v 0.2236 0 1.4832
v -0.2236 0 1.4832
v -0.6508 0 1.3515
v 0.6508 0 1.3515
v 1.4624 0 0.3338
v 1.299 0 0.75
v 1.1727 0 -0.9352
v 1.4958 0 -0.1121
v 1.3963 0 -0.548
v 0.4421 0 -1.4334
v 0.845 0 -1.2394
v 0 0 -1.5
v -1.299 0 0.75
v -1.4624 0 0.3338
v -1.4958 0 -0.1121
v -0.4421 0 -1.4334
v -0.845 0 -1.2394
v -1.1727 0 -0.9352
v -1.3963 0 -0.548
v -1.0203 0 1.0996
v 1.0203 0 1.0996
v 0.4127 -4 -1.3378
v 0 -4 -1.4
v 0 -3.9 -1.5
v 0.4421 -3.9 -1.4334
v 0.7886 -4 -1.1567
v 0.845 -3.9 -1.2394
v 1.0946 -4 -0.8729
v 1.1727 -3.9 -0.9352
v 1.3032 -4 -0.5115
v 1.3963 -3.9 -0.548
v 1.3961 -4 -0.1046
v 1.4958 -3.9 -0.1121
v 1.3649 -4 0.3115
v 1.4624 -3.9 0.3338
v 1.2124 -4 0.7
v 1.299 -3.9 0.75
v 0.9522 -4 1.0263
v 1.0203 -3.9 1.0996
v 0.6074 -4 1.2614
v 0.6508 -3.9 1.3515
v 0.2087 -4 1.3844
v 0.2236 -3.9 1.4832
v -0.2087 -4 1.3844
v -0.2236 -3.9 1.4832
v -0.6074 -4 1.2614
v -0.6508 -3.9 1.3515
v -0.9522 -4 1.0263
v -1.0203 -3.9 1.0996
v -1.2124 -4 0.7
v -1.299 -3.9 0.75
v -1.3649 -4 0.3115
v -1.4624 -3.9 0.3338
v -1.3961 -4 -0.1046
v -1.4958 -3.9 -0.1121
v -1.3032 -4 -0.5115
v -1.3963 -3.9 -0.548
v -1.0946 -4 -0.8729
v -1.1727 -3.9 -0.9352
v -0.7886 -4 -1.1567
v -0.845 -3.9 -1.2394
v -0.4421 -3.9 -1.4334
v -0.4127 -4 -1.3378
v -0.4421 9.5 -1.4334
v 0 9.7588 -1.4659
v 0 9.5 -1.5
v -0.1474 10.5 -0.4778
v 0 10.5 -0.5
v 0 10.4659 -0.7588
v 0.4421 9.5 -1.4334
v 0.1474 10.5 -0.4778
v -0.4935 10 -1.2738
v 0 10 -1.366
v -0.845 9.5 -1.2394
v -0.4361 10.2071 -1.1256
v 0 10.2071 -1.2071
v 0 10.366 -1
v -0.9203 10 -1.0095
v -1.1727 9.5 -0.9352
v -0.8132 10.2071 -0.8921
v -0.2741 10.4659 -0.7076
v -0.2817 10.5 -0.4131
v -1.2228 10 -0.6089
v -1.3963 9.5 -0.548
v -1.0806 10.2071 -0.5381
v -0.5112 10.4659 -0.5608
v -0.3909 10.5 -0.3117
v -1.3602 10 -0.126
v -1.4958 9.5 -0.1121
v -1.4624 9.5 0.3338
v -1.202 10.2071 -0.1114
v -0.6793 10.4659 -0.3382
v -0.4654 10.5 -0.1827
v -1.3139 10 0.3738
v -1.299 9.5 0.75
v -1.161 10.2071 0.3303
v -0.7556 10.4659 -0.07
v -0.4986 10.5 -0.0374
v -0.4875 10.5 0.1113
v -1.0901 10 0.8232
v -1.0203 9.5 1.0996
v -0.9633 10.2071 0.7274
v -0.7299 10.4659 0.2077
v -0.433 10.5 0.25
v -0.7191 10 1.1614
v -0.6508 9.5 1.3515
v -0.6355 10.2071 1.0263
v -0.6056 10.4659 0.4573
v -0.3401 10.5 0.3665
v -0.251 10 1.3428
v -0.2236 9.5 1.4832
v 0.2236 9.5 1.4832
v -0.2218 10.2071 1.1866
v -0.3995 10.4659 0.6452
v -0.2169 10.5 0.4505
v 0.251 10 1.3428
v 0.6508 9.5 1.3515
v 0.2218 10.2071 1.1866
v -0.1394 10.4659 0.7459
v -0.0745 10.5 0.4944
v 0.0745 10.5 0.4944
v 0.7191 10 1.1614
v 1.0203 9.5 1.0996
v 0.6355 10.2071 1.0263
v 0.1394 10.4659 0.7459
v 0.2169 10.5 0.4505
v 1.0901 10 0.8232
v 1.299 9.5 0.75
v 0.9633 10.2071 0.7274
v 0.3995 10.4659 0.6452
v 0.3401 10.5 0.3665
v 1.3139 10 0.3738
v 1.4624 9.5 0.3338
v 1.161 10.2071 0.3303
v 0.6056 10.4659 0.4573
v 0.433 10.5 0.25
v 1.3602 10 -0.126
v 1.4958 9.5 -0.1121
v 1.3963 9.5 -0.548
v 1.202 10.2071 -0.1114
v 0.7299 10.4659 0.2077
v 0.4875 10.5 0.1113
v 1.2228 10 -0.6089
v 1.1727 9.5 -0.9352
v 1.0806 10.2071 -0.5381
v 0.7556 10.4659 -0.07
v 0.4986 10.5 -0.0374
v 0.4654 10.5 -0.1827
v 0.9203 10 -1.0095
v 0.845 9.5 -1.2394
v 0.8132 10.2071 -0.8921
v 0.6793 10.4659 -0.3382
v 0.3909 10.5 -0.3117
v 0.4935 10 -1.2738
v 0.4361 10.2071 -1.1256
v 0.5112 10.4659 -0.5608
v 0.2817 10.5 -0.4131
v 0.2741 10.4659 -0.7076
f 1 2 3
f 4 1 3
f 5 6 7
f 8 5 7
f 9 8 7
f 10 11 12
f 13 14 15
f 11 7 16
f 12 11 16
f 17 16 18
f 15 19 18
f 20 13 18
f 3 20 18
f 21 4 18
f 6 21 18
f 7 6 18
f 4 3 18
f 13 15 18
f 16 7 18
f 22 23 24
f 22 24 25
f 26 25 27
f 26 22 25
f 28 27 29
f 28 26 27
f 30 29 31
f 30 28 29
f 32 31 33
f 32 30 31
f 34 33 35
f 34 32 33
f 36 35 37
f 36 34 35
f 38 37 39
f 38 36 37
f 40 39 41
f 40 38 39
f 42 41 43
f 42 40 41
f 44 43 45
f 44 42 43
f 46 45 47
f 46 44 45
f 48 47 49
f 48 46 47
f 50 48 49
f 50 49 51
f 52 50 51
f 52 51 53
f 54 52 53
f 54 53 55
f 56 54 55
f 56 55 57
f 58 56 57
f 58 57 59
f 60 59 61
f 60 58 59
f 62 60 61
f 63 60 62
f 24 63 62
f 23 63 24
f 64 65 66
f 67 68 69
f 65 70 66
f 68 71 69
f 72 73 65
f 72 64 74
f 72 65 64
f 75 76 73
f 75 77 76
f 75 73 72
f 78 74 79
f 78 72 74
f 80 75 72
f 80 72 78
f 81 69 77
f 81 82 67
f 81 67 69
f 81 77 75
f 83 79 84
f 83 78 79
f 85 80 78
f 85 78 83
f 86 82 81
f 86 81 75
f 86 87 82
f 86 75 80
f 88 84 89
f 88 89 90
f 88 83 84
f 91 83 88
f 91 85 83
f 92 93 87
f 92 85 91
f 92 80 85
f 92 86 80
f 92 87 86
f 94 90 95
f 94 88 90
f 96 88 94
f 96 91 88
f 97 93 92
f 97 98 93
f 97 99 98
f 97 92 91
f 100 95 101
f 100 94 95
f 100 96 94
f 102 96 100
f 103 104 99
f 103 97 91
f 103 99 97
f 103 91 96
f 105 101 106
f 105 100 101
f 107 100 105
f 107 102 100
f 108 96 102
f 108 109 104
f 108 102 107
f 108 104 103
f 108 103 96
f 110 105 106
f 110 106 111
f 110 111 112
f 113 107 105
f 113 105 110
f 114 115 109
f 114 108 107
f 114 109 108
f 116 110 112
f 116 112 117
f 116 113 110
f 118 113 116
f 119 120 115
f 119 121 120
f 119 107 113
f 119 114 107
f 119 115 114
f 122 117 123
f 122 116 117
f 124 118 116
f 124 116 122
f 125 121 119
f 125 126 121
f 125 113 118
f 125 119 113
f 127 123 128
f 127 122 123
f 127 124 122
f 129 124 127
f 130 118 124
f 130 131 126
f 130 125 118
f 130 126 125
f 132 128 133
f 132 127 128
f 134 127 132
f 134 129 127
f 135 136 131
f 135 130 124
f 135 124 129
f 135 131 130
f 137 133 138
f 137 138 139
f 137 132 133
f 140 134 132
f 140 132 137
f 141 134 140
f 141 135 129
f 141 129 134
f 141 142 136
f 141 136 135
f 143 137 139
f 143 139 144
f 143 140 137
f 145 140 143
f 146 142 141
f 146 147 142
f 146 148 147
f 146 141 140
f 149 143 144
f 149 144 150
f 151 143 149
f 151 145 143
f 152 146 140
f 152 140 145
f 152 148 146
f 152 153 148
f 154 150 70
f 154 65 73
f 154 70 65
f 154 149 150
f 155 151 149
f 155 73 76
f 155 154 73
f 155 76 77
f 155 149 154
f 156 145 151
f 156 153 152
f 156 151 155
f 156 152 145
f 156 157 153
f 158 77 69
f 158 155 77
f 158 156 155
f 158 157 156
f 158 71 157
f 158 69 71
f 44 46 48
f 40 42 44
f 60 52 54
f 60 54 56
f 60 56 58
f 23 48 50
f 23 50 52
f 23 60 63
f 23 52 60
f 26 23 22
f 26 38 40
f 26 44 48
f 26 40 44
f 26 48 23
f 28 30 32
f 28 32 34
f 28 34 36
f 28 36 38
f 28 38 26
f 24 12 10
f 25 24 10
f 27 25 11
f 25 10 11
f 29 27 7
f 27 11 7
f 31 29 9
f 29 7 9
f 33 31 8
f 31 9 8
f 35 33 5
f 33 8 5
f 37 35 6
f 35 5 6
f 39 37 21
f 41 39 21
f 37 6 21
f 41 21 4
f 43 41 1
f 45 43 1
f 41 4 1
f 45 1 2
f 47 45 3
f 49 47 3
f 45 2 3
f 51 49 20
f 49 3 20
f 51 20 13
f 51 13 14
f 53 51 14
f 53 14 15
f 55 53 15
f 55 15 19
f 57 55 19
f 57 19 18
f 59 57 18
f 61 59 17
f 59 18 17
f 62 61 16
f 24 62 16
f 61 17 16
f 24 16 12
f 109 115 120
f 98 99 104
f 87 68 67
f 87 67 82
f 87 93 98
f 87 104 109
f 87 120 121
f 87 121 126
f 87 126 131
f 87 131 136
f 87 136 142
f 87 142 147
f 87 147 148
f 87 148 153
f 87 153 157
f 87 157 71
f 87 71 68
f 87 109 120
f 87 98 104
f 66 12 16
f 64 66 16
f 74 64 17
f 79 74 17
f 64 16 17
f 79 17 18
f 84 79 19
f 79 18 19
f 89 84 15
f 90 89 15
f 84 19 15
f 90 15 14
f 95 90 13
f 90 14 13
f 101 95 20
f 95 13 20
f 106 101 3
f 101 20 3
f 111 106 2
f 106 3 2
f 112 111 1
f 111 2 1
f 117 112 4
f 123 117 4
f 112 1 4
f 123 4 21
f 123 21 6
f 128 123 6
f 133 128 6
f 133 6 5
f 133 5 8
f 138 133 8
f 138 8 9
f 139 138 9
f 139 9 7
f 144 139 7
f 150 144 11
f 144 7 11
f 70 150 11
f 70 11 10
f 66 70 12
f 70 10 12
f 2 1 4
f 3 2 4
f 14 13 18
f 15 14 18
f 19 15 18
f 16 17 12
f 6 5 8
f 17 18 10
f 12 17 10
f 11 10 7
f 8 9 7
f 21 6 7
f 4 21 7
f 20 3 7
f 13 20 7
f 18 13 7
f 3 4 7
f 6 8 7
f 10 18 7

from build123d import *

# Parameters (mm, degrees)
SKETCH1_R           = 1.5
BOSS_EXTRUDE1_DEPTH = 10.5
FILLET1_R           = 1
SKETCH2_R           = 1.5
BOSS_EXTRUDE2_DEPTH = 4
CHAMFER1_SIZE       = 0.1


with BuildPart() as part:
    # Sketch1 → Boss-Extrude1 (new body)
    with BuildSketch(Plane(origin=(0, 0, 0), x_dir=(1, 0, 0), z_dir=(0, 1, 0))):
        with Locations(Location((0, 0, 0), (0, 0, 90))):
            Circle(SKETCH1_R)
    extrude(amount=BOSS_EXTRUDE1_DEPTH)

    # Fillet1
    fillet1_edges = [part.edges().sort_by_distance(p)[0] for p in [
        (0, 10.5, 1.5),
    ]]
    fillet(fillet1_edges, radius=FILLET1_R)


with BuildPart() as body_2:
    # Sketch2 → Boss-Extrude2 (new body)
    with BuildSketch(Plane.XZ):
        with Locations(Location((0, 0, 0), (0, 0, 270))):
            Circle(SKETCH2_R)
    extrude(amount=BOSS_EXTRUDE2_DEPTH)

    # Chamfer1
    chamfer1_edges = [body_2.edges().sort_by_distance(p)[0] for p in [
        (0, -4, 1.5),
    ]]
    chamfer(chamfer1_edges, length=CHAMFER1_SIZE)


solid = Compound([part.part, body_2.part])
